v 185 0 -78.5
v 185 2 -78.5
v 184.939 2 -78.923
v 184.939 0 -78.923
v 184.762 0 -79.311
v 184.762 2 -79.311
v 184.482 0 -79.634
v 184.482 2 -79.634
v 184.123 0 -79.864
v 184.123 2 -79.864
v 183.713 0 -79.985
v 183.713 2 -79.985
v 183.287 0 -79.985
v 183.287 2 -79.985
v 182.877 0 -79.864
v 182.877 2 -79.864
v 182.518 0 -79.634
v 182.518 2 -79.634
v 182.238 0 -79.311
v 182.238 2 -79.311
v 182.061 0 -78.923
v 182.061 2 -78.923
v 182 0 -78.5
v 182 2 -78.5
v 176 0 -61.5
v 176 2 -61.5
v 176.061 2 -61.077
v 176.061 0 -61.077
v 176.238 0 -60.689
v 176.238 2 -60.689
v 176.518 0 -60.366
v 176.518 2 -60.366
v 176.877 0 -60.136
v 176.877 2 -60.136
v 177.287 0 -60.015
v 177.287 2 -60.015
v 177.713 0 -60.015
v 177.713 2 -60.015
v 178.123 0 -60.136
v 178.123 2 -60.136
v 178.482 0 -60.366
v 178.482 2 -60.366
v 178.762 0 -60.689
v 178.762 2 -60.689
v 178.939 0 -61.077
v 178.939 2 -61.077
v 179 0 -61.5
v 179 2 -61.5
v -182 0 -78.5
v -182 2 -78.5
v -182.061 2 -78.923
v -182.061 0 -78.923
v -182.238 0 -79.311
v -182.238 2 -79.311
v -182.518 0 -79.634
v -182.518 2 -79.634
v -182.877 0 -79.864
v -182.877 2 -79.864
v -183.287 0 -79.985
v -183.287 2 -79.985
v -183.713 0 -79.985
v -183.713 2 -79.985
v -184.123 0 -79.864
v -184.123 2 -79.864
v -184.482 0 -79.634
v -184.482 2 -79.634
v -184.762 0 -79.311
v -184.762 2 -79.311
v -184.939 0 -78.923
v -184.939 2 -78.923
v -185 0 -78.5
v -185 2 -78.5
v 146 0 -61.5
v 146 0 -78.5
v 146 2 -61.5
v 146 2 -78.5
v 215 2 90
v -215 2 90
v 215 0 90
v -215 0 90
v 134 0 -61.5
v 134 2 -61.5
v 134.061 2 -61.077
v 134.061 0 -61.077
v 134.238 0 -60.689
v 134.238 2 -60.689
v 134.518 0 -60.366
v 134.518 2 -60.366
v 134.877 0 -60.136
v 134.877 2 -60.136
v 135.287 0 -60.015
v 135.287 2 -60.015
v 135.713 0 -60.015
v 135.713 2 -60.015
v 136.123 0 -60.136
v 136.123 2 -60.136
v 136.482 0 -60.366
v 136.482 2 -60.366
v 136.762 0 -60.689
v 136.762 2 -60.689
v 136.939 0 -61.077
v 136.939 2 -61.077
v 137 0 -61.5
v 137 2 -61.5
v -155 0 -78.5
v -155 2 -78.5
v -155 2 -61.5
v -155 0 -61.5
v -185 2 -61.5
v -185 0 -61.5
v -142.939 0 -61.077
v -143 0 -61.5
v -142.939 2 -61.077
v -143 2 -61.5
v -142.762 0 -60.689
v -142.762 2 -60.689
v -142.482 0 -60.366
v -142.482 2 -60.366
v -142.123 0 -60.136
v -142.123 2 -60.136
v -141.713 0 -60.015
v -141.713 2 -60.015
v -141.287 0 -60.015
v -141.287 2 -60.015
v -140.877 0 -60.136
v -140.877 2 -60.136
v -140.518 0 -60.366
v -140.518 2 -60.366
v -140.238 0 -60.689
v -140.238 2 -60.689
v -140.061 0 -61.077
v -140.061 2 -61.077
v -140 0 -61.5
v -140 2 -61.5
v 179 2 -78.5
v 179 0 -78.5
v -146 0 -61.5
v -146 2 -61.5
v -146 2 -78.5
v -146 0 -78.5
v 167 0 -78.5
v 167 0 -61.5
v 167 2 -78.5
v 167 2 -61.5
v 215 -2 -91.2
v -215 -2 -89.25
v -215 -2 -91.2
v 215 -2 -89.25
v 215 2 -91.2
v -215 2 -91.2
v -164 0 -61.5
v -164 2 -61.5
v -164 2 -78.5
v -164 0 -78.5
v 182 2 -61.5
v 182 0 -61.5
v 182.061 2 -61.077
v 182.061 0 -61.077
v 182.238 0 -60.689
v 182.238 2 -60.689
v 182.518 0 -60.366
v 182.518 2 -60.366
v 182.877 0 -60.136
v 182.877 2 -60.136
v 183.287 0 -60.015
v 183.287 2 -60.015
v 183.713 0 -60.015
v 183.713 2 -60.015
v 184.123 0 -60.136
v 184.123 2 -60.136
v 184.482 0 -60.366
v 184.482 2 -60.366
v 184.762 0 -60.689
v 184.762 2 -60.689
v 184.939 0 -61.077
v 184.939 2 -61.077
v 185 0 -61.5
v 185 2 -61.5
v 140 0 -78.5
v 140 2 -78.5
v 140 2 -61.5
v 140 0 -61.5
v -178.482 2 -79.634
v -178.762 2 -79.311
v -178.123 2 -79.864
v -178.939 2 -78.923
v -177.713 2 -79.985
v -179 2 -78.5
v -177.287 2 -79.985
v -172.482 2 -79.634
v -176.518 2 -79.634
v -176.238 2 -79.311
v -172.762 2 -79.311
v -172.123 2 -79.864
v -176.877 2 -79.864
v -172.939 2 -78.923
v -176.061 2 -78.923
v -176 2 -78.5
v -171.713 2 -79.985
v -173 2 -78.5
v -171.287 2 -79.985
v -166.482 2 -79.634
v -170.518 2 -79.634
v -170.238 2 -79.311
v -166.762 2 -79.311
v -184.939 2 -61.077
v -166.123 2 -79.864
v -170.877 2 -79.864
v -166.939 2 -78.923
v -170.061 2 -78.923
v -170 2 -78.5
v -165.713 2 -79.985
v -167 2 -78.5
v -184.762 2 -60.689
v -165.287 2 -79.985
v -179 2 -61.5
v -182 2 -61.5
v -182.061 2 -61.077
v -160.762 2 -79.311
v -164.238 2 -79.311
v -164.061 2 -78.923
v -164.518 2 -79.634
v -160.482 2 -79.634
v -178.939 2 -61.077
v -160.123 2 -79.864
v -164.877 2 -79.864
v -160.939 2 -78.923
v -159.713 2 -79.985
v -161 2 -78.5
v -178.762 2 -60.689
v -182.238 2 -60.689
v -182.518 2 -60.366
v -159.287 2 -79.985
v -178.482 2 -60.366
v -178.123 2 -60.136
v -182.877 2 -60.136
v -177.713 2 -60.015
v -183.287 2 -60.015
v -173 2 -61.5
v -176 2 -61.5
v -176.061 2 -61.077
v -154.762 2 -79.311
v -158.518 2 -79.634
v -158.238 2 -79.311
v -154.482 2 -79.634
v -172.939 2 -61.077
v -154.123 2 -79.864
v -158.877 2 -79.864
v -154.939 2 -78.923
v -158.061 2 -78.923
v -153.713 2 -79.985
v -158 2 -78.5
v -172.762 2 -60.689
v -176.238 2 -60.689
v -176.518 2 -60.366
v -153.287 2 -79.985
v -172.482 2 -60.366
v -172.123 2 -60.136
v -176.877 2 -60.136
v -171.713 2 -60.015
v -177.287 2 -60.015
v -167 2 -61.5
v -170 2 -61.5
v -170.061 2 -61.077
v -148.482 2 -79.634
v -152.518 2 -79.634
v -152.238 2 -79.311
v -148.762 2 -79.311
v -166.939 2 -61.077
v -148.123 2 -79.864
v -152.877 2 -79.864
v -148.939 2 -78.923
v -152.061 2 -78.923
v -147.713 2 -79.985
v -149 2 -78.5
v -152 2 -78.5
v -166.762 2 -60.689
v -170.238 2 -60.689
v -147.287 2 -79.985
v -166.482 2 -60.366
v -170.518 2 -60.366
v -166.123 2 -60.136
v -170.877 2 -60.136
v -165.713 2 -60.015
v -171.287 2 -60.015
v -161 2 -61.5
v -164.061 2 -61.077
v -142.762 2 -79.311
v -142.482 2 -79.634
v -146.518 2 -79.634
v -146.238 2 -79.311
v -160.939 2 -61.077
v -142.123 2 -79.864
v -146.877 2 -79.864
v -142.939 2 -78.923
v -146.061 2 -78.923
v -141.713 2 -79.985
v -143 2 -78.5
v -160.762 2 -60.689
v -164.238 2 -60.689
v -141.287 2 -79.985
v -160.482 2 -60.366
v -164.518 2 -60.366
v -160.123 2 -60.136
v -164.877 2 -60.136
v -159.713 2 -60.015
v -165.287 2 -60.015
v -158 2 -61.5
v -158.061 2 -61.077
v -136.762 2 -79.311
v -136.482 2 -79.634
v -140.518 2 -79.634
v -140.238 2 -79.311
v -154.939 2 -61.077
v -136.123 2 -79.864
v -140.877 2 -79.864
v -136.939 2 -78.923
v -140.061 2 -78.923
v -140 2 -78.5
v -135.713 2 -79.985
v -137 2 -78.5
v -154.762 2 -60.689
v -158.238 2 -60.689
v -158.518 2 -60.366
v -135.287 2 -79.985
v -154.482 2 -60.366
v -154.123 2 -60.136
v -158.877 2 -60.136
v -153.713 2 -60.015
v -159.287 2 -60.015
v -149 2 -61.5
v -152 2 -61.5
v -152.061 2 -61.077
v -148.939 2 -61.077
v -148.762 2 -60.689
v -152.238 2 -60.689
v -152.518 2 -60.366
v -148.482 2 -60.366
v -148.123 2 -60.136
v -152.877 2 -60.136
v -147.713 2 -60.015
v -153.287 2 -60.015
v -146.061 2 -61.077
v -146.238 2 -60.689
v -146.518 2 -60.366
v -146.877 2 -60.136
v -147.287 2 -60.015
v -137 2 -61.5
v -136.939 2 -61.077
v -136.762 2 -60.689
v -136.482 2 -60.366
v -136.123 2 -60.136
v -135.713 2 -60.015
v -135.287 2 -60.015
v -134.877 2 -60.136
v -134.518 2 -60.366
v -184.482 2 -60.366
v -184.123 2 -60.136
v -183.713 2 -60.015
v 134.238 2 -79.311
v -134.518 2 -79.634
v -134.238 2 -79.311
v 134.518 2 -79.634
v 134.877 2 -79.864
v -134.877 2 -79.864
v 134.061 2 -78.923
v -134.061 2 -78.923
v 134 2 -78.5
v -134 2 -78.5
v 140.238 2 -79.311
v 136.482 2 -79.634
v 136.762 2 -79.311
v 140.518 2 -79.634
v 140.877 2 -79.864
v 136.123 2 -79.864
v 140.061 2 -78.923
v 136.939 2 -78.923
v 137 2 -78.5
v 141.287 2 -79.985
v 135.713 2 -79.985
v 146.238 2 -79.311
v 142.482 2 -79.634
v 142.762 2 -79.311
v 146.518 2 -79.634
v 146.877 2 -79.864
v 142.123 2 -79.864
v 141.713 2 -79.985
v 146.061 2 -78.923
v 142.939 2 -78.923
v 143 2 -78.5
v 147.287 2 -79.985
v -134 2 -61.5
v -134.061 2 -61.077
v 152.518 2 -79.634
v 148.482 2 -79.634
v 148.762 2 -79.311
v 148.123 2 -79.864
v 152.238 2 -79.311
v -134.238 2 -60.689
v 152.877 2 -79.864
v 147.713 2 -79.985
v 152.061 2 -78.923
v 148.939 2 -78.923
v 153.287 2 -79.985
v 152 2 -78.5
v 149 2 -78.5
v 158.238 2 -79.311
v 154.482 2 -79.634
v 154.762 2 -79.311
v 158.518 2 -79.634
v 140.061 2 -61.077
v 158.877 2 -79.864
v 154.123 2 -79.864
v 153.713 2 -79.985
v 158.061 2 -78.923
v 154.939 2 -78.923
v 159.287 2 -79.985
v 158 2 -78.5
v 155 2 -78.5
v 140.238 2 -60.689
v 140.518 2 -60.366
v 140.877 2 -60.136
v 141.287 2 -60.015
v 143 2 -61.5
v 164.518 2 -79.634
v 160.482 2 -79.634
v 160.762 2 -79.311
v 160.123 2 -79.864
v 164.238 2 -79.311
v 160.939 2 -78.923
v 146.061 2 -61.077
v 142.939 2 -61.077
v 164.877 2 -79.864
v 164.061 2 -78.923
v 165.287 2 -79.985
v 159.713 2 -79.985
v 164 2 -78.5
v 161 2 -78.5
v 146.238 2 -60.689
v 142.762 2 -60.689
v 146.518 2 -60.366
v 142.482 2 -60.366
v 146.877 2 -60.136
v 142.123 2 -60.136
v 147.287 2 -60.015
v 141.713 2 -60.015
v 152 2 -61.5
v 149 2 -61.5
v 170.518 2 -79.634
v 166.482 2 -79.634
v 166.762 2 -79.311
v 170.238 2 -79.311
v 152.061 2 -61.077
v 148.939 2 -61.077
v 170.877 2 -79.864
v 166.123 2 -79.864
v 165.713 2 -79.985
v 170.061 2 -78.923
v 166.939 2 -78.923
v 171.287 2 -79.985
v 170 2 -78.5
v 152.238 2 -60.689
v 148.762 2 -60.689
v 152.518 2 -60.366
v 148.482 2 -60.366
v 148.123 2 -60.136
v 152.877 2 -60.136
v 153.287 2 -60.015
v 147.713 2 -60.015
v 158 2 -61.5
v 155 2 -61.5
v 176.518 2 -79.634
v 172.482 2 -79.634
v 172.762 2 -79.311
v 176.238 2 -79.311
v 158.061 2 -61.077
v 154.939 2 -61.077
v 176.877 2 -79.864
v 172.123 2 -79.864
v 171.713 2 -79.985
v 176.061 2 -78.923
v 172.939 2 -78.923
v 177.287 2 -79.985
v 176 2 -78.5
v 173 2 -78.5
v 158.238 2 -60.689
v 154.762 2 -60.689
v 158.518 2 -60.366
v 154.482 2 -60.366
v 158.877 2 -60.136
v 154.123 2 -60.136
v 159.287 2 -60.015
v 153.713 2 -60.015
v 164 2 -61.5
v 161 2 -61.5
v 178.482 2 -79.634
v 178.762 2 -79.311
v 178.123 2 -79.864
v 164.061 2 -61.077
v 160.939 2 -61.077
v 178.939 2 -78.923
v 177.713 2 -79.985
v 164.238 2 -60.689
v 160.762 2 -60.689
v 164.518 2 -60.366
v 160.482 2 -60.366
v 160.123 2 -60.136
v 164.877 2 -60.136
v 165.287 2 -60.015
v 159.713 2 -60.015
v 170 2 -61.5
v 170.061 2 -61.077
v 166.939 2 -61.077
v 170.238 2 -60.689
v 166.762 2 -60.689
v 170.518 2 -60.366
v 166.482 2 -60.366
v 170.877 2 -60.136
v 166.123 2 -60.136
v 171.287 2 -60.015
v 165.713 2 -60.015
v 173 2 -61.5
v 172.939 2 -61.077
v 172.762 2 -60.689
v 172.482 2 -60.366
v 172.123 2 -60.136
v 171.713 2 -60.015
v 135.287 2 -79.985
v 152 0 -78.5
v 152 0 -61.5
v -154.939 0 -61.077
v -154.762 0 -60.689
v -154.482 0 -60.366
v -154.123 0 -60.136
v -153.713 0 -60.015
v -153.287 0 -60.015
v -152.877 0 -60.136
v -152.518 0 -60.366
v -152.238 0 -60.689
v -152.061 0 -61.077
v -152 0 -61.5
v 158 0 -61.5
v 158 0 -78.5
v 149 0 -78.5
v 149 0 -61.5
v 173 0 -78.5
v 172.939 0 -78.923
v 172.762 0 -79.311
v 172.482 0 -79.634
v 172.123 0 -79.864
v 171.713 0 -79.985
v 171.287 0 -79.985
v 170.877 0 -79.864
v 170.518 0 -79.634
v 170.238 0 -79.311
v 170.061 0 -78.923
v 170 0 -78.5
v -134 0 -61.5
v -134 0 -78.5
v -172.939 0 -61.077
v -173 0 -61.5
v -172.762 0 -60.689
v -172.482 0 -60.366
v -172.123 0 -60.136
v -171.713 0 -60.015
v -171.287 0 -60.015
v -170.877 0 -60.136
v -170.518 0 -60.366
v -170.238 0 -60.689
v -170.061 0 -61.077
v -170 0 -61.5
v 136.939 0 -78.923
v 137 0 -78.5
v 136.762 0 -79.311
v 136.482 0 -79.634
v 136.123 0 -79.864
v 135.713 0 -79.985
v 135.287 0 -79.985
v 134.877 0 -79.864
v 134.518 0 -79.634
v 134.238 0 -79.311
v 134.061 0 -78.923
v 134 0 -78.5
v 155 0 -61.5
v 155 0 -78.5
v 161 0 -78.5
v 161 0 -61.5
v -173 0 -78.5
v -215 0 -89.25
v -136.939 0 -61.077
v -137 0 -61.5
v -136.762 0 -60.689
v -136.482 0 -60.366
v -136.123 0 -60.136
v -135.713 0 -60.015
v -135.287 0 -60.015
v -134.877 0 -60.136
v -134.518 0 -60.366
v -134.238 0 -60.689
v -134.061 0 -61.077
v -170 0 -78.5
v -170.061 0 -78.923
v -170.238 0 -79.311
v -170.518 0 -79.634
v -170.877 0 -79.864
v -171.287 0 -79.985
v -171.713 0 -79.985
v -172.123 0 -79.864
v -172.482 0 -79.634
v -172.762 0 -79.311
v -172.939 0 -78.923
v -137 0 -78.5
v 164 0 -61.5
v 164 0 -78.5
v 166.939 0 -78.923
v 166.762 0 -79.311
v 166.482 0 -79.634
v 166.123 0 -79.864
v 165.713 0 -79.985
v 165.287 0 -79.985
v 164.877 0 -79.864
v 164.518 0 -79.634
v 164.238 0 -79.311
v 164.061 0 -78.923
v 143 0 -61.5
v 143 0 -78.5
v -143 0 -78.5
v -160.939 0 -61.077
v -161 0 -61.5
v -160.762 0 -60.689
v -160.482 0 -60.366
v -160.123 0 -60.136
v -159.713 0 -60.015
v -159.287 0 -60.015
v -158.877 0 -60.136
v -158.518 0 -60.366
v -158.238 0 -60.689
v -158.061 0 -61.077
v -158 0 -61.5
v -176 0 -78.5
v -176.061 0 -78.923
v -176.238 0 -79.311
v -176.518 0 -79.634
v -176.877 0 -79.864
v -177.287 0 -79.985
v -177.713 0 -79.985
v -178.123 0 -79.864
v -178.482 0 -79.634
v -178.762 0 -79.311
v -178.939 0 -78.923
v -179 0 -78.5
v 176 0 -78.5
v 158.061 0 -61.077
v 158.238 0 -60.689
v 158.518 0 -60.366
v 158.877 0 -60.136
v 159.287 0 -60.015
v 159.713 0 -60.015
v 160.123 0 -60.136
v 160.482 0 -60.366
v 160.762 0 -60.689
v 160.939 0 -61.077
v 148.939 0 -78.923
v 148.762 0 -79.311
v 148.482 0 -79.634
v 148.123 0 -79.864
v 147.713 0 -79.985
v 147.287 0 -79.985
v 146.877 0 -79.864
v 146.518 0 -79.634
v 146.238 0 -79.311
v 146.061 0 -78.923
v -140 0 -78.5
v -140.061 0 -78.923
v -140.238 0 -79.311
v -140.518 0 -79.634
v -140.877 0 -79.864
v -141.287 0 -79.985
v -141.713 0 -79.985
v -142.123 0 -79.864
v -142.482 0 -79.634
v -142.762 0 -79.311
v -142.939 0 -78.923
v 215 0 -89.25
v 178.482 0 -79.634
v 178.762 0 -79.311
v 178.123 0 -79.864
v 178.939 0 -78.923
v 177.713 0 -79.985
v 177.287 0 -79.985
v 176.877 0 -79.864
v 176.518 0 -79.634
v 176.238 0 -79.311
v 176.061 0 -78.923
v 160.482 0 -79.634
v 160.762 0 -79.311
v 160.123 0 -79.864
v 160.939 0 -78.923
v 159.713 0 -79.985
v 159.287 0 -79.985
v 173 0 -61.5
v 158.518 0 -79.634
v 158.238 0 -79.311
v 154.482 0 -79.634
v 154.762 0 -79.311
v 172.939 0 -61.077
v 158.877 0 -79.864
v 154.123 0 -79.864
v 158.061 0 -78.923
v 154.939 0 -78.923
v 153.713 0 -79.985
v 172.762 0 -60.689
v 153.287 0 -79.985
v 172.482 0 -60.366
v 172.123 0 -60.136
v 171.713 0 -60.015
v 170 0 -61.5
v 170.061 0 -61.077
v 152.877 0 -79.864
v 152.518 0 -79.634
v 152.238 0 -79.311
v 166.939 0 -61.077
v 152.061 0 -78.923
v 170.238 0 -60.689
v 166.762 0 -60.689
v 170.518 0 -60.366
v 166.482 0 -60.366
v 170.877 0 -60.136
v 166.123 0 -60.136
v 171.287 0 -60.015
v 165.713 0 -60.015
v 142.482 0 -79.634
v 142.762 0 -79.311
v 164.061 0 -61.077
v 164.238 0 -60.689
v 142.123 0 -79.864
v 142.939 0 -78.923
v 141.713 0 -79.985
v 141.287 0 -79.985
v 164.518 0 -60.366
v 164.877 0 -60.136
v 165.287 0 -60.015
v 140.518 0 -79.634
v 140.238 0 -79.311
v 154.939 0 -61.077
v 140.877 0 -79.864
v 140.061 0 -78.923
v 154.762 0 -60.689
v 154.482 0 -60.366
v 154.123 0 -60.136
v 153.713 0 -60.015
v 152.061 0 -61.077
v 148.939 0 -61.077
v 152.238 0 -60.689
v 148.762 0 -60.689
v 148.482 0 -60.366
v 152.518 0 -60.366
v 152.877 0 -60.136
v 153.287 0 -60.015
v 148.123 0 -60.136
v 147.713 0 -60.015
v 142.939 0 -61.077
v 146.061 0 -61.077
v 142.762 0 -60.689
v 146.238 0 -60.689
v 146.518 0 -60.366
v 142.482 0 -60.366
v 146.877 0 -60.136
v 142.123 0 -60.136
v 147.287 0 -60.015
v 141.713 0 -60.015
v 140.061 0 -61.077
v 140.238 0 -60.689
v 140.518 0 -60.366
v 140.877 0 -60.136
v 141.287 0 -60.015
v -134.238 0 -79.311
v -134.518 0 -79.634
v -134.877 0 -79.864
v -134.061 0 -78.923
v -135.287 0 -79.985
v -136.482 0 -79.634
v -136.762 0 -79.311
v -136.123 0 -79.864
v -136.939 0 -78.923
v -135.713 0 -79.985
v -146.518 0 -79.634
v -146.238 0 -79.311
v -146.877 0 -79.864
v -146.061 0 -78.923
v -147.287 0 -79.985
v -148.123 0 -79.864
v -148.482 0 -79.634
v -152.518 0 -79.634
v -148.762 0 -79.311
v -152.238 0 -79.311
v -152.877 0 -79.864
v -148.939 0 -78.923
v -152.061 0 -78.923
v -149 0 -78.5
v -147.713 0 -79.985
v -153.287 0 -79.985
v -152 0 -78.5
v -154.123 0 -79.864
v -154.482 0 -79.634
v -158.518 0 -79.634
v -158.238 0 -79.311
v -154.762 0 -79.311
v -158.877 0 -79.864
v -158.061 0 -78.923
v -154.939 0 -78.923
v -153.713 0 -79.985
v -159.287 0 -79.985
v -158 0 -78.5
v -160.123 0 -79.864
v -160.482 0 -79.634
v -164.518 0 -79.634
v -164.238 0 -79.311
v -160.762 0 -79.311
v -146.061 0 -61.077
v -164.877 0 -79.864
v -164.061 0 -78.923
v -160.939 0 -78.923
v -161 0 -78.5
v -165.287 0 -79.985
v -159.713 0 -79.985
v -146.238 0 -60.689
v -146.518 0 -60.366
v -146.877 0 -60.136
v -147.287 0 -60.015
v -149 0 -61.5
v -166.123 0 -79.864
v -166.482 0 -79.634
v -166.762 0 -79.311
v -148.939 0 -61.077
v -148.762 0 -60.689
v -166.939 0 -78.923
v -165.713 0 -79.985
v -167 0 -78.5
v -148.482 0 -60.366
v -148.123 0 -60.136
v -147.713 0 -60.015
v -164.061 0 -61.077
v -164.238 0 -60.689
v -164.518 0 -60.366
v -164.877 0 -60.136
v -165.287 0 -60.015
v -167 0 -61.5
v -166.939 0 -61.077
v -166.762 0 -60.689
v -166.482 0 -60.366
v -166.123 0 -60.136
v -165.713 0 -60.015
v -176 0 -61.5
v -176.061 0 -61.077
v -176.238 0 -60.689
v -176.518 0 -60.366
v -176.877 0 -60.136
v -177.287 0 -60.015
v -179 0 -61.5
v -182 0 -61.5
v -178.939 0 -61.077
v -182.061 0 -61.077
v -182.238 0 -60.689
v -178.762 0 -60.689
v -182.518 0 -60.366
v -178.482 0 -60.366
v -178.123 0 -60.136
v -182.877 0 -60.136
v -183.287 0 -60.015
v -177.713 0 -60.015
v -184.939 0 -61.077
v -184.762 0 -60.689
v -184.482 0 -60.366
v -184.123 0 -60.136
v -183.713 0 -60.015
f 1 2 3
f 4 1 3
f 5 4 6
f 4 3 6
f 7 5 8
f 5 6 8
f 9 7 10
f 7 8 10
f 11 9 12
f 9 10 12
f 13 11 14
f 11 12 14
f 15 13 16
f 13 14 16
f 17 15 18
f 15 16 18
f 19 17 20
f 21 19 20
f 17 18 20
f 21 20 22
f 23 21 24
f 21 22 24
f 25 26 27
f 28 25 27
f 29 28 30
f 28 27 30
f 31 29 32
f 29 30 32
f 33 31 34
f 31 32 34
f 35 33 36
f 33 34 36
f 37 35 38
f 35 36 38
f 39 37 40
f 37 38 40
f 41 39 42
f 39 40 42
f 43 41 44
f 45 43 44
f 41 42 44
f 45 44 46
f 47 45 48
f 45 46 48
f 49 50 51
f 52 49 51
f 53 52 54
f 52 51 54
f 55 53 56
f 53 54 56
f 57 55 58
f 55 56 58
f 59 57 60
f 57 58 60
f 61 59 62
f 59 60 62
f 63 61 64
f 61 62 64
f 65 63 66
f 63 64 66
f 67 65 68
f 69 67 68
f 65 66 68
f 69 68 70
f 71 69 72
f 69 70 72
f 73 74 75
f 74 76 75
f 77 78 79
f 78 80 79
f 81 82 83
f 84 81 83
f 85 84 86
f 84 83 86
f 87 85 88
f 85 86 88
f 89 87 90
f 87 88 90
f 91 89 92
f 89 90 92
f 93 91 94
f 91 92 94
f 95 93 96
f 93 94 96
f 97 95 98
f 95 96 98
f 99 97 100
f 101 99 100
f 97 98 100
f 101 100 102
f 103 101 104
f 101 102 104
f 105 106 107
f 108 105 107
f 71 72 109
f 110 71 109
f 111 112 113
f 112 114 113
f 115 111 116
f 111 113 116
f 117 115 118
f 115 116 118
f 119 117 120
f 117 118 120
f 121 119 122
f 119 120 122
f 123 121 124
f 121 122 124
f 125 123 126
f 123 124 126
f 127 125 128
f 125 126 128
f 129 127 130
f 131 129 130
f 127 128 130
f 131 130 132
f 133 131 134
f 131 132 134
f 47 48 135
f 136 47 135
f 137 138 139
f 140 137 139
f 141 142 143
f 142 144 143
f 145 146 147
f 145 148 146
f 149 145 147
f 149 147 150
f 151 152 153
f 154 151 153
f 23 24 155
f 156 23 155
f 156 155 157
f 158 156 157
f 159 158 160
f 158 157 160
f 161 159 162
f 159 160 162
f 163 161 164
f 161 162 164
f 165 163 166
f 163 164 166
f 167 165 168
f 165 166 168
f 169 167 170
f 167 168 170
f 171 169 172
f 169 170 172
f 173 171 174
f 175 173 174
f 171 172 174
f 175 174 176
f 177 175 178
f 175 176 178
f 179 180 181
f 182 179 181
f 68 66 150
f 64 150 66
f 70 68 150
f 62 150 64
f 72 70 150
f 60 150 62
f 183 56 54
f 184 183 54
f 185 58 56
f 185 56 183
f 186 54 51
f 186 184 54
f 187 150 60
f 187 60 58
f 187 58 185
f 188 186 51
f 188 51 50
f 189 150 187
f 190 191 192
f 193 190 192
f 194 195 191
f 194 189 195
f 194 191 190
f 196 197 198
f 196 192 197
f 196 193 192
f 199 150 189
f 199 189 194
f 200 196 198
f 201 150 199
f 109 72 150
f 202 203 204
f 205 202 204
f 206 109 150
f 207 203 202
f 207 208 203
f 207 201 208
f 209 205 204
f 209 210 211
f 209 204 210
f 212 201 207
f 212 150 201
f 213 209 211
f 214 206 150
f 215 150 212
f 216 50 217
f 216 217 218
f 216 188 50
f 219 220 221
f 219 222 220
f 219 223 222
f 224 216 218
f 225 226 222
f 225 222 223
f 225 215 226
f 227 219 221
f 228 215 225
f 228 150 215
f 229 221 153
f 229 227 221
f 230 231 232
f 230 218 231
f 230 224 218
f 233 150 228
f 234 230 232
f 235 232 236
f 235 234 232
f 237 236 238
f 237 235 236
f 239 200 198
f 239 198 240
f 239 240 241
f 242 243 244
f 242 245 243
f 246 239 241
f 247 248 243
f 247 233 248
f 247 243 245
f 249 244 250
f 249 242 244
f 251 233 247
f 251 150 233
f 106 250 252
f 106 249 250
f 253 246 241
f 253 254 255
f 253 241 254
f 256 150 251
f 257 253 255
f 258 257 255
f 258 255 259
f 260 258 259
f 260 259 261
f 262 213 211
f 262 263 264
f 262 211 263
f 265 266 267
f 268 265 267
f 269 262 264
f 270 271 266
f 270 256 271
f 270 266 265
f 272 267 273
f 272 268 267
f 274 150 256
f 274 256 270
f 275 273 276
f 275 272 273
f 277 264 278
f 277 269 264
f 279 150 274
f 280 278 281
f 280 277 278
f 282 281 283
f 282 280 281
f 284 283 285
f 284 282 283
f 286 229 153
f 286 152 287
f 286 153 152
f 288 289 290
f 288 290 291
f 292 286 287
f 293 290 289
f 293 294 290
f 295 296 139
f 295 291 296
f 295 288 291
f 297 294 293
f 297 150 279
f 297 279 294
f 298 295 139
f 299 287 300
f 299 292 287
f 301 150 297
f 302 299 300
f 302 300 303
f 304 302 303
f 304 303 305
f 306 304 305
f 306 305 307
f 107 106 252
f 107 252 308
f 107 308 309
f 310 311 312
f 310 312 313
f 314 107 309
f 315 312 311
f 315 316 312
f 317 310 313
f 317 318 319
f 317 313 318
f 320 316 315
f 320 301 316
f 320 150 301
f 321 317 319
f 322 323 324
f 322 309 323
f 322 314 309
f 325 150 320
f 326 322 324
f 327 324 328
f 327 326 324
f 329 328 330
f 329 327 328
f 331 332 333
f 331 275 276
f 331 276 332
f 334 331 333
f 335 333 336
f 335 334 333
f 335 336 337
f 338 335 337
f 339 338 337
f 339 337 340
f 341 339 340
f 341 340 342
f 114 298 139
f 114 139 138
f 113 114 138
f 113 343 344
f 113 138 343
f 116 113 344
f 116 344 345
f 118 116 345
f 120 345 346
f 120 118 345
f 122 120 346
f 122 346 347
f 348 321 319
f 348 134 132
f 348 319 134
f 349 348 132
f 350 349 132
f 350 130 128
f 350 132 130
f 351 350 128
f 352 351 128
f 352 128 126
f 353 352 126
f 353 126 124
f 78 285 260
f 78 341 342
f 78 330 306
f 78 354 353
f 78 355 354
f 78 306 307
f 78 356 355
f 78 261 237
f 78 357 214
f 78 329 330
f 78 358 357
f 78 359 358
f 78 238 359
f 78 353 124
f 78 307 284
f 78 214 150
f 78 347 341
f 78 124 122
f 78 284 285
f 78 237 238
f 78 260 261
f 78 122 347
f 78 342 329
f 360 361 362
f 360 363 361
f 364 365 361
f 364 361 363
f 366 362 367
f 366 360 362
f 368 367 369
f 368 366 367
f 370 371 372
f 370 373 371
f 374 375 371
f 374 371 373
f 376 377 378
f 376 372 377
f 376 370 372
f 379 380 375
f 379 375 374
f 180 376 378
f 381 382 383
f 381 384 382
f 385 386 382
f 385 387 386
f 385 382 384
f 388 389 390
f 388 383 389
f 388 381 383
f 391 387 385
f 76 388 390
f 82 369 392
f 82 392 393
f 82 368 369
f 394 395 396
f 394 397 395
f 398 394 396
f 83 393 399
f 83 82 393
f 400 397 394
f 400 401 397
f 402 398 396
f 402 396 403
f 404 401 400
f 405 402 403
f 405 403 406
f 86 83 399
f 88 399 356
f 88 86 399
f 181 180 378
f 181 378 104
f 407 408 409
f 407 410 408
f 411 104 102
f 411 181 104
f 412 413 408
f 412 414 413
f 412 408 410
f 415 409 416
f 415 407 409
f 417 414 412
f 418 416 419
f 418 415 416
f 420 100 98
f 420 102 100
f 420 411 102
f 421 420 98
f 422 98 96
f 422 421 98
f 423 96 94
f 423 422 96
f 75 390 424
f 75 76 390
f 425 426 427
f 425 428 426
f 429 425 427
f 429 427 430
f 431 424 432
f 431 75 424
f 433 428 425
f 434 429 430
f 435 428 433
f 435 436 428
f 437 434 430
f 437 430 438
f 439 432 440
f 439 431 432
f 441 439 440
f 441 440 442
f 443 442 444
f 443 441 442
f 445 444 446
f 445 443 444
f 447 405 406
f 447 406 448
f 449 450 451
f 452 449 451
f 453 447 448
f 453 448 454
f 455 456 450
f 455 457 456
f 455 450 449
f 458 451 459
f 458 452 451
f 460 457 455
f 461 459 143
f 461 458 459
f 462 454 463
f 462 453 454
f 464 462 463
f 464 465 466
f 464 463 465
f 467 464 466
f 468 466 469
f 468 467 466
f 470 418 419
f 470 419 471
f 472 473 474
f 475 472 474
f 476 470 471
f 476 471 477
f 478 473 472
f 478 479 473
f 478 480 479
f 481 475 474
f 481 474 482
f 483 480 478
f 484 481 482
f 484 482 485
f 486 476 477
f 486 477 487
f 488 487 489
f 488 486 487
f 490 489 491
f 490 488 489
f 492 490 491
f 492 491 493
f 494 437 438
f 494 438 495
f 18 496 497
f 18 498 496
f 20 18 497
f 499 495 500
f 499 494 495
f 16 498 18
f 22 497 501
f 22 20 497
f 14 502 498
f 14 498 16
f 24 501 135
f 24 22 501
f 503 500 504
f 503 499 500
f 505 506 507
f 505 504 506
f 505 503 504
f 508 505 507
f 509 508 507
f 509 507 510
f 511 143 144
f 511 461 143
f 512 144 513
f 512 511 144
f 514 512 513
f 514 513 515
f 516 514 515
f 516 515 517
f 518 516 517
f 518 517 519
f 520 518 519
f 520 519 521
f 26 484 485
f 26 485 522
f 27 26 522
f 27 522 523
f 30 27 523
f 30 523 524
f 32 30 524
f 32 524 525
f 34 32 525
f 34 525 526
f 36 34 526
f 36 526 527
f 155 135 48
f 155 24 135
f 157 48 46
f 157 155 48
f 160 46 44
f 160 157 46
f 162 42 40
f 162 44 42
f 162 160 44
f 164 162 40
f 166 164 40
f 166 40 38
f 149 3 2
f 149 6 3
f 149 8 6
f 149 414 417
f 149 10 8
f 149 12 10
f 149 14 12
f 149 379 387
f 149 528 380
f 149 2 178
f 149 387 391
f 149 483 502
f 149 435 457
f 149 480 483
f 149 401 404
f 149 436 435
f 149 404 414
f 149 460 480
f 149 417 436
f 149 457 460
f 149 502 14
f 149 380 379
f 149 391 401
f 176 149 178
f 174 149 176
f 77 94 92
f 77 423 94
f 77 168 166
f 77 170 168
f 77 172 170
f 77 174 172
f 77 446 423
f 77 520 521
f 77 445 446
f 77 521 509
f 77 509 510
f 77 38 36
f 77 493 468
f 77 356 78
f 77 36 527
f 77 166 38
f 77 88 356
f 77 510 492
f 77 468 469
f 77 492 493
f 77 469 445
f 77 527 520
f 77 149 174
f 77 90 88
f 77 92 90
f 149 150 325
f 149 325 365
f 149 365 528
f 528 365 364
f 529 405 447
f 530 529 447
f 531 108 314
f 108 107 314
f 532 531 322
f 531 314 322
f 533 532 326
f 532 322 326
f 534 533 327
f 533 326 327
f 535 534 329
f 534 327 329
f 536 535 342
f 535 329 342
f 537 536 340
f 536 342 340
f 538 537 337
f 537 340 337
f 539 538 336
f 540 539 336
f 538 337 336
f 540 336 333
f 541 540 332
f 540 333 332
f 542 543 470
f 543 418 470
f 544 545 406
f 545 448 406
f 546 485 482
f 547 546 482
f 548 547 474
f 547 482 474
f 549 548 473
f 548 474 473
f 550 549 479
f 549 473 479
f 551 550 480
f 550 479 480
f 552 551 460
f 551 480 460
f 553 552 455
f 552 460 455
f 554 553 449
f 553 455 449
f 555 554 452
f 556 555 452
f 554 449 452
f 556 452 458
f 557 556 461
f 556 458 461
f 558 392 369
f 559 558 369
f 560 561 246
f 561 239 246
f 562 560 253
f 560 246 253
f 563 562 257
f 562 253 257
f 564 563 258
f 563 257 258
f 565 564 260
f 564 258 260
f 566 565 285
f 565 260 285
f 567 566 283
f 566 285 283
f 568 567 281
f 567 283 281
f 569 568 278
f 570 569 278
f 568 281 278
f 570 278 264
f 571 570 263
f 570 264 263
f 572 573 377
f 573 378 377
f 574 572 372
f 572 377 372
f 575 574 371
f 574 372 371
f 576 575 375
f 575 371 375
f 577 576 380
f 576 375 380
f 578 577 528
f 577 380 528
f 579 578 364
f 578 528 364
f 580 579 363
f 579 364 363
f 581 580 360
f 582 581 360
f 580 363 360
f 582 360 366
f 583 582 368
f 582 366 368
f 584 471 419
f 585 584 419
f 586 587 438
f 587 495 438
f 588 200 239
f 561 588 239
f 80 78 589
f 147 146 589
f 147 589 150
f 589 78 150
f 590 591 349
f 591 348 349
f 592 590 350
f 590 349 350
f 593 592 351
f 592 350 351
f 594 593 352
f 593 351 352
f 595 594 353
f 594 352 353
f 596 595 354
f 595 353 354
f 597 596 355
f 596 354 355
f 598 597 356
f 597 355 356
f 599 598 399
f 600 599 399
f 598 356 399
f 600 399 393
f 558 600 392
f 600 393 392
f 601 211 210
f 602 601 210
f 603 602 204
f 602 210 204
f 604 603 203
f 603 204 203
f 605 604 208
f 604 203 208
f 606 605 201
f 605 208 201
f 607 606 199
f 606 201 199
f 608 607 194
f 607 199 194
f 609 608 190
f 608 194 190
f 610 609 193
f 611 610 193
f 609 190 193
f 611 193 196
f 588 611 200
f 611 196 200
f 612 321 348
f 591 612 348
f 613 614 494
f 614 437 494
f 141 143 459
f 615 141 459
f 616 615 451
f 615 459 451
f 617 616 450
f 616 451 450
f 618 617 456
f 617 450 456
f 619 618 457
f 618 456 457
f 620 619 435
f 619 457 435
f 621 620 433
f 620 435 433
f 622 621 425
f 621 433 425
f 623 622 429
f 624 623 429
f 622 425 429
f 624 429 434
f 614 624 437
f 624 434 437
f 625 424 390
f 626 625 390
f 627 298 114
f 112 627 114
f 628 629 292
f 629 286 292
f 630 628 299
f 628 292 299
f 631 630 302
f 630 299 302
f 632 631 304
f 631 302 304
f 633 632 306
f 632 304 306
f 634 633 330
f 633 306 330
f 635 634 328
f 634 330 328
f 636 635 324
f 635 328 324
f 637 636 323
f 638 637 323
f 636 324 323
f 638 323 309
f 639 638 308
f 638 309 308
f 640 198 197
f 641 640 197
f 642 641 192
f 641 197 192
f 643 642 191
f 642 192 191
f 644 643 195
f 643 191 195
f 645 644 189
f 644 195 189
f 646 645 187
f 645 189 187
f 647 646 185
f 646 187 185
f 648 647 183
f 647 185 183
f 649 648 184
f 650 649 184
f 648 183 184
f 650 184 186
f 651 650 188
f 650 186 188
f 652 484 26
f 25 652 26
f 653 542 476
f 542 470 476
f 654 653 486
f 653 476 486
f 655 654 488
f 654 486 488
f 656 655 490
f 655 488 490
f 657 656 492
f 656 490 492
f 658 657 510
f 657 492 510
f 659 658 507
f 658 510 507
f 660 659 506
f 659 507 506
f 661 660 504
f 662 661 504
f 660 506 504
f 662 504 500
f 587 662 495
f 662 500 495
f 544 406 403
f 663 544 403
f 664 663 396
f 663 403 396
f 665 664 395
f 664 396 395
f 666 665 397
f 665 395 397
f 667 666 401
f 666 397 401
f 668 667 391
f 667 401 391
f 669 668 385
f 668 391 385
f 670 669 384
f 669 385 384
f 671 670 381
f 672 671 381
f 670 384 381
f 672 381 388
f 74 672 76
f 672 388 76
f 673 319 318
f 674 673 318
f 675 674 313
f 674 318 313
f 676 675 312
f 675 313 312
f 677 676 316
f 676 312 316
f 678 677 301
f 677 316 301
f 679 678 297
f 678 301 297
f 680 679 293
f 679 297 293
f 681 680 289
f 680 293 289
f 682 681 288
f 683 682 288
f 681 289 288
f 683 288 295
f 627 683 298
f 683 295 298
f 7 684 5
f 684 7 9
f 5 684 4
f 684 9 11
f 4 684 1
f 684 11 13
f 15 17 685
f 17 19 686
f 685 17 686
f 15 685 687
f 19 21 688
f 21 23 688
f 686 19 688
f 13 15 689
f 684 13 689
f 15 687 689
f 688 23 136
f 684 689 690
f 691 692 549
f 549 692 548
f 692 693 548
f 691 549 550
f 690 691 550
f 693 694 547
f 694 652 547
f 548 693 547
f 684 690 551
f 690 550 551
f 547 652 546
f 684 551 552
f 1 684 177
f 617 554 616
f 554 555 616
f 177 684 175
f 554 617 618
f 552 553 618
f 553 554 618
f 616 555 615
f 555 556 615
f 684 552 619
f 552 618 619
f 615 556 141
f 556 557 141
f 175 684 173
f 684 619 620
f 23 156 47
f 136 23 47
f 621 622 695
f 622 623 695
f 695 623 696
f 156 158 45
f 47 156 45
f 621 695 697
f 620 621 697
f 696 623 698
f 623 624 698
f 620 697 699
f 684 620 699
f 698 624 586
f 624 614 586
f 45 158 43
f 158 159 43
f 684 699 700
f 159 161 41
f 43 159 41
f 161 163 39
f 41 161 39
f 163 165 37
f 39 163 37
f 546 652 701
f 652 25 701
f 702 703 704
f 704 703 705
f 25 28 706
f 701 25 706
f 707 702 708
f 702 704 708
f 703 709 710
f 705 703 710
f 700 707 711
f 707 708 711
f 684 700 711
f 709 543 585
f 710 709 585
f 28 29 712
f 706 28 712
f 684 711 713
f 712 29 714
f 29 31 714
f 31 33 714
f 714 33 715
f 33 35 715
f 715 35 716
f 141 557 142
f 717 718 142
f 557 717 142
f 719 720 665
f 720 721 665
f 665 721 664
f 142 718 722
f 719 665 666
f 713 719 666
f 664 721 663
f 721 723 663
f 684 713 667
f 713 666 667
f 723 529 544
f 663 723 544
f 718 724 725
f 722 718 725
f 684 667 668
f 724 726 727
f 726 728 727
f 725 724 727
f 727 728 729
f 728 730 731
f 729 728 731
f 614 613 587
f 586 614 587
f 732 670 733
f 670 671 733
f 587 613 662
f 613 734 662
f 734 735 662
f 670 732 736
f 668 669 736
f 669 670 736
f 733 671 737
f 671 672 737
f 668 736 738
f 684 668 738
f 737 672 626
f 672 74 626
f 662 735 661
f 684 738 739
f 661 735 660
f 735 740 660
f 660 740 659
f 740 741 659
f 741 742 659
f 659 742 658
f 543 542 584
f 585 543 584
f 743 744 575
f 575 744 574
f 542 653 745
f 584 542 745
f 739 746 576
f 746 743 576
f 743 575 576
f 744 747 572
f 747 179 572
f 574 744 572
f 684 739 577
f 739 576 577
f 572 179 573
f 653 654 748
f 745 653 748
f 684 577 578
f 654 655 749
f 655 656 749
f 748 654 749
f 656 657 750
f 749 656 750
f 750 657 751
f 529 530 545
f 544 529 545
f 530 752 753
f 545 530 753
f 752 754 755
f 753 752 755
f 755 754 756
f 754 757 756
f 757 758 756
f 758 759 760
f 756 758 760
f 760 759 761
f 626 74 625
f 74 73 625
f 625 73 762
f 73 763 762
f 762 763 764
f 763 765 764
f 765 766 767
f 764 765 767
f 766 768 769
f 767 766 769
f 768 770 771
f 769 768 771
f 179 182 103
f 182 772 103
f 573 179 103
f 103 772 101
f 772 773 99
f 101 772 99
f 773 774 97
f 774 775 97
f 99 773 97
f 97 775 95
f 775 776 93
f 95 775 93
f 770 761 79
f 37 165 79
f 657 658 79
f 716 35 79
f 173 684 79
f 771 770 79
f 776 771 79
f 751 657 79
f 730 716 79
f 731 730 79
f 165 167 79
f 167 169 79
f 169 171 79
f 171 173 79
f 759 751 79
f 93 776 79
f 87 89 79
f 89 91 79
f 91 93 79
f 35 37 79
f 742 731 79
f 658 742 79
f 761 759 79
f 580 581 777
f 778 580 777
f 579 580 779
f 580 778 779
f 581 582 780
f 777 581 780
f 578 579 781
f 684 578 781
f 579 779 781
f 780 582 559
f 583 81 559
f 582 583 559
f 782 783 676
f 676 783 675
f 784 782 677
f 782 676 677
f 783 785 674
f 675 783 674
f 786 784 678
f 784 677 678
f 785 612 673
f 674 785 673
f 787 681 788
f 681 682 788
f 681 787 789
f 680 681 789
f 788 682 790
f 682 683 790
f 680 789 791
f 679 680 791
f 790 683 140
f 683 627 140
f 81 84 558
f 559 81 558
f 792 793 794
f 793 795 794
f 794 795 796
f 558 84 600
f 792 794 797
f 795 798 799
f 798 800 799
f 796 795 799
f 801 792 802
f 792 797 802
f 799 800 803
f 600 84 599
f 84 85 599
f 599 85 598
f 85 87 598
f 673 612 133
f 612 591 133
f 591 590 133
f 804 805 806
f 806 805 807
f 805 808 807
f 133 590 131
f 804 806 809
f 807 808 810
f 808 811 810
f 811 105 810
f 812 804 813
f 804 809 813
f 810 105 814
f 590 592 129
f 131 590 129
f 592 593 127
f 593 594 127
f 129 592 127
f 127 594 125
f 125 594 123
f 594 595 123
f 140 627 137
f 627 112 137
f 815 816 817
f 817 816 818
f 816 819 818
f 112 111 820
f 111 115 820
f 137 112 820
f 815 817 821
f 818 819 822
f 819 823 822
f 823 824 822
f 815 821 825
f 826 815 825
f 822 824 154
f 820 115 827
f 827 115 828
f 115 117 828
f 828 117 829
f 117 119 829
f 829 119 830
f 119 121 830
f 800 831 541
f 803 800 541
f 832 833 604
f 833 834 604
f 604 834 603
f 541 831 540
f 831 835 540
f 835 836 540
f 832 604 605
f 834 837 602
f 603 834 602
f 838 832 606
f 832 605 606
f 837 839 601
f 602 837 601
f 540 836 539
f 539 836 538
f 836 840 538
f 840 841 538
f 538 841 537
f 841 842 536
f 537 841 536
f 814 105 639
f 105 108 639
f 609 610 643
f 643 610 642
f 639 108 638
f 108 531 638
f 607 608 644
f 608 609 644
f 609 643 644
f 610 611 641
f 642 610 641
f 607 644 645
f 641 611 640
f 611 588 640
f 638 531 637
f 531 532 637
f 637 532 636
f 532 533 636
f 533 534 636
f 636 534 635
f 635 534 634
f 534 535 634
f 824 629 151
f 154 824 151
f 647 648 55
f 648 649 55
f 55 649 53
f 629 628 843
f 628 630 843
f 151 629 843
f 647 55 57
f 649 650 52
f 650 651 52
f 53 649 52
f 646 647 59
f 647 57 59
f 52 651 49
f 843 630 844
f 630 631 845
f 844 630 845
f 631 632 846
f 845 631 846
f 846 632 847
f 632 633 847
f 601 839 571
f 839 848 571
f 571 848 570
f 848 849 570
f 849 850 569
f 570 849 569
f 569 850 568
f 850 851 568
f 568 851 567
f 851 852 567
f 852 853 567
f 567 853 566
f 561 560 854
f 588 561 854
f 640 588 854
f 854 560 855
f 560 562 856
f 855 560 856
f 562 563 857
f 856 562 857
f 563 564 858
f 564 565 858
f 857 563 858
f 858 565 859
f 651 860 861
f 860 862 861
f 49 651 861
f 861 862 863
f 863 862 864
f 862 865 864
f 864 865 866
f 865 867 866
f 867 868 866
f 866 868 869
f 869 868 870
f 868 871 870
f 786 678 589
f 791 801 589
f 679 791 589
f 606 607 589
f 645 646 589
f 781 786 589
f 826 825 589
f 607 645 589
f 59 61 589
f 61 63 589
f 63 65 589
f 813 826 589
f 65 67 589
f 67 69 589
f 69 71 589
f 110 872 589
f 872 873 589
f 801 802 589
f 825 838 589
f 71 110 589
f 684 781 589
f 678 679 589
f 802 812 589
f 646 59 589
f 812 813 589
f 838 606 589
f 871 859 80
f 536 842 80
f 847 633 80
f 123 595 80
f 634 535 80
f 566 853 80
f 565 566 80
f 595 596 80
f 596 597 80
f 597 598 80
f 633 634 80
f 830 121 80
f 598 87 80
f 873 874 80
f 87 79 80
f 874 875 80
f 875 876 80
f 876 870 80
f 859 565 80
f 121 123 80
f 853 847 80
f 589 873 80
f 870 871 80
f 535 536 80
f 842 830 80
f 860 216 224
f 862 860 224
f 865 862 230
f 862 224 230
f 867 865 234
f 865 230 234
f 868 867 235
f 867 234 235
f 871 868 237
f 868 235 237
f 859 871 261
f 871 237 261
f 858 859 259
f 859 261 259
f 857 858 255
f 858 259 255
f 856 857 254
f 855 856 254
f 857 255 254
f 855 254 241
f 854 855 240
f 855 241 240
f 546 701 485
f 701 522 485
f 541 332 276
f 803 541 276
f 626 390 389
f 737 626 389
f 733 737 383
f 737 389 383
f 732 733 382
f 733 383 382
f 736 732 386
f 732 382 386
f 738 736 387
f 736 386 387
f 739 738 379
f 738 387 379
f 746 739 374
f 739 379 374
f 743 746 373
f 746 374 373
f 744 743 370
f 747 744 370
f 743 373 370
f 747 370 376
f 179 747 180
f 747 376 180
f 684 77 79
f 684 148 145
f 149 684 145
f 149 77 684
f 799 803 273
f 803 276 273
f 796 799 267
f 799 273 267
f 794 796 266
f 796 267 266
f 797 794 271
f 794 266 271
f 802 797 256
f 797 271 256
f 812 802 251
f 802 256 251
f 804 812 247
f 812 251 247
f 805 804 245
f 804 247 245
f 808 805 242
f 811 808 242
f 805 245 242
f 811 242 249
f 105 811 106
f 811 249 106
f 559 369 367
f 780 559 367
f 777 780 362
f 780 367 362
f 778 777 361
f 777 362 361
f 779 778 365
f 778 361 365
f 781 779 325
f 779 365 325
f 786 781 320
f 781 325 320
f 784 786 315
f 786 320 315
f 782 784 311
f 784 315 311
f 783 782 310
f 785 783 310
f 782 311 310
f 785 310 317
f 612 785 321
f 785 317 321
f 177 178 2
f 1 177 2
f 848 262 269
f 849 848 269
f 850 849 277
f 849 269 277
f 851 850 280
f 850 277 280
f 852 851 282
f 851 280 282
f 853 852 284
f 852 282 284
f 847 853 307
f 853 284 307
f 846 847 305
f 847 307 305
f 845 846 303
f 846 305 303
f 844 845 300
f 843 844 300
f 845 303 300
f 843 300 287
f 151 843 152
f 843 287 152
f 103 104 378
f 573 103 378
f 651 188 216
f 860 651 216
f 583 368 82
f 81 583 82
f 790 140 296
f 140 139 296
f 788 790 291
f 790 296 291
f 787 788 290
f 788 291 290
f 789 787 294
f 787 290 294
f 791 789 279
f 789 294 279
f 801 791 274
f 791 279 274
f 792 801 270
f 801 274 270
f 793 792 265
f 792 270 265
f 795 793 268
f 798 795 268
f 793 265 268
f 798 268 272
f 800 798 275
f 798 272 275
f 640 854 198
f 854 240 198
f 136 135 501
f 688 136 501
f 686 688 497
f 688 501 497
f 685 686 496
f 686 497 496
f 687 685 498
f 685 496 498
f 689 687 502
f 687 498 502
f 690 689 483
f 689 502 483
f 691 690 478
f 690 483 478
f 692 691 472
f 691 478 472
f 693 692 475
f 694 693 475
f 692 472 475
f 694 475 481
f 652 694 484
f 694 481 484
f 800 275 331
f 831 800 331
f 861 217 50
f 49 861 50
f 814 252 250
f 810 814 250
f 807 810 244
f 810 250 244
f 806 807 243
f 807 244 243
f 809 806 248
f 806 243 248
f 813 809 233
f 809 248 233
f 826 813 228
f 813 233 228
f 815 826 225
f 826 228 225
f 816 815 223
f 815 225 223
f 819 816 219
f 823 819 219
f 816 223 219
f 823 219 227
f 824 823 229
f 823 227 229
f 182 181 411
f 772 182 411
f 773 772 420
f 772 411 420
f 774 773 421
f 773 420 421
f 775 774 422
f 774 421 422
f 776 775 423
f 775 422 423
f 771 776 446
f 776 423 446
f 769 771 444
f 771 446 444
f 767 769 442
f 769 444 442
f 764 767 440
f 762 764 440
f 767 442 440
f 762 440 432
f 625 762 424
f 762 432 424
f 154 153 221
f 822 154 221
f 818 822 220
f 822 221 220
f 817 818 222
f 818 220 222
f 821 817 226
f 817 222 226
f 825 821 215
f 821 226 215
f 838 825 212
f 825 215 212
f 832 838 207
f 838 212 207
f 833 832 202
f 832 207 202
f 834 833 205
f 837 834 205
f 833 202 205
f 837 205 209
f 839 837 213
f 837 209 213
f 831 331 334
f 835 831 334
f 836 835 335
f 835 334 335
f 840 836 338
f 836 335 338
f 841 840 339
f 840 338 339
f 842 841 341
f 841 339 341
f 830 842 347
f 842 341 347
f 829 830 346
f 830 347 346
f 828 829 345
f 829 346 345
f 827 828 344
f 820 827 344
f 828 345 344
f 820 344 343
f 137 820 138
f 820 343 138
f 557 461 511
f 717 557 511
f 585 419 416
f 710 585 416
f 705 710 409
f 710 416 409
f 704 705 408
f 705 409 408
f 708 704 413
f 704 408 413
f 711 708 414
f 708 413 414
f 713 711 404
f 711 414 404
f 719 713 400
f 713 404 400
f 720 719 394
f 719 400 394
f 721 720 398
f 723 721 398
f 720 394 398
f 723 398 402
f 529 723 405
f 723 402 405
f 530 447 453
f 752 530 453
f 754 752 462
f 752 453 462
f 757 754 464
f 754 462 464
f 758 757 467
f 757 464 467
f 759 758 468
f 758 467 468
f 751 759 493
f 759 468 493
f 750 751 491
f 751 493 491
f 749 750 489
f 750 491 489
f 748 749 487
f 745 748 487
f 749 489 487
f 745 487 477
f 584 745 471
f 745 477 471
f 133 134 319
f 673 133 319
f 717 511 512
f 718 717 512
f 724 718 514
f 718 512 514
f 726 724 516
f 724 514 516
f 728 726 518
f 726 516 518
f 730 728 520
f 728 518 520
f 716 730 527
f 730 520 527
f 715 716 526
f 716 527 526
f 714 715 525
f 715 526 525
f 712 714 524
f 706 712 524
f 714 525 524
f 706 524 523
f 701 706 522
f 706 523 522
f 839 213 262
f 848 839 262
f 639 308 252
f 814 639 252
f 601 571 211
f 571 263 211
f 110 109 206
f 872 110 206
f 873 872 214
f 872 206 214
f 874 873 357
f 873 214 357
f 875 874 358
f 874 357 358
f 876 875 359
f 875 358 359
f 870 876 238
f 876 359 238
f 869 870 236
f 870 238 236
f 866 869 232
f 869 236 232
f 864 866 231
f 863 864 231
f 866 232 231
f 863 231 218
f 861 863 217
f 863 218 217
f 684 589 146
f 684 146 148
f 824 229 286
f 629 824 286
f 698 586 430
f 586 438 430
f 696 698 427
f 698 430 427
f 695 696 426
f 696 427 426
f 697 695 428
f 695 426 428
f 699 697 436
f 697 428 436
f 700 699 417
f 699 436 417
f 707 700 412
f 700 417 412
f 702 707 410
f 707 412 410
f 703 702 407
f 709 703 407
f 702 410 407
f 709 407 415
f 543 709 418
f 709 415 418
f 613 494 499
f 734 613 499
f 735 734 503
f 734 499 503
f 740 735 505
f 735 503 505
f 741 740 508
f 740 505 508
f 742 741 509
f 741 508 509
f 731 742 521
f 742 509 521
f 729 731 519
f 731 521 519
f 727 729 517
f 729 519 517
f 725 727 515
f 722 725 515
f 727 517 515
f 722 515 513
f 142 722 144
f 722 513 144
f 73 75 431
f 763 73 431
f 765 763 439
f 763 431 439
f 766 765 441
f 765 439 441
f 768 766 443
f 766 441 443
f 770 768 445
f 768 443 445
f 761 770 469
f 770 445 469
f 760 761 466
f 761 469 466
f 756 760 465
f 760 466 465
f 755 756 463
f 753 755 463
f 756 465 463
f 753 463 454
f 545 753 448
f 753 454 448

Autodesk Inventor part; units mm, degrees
ref_plane "YZ Plane" through (0, 0, 0) normal (1, 0, 0) x (0, 1, 0)
ref_plane "XZ Plane" through (0, 0, 0) normal (0, 1, 0) x (-1, 0, 0)
ref_plane "XY Plane" through (0, 0, 0) normal (0, 0, 1) x (1, 0, 0)
sketch "Esboço1" plane through (0, 0, 0) normal (0, 1, 0) x (-1, 0, 0)
  line L0 (215, 90) -> (-215, 90)
  line L1 (-215, 90) -> (-215, -90)
  line L2 (-215, -90) -> (215, -90)
  line L3 (215, -90) -> (215, 90)
  point P0 (0, 0)
  dimension "d3" = 180
  dimension "d5" = 215
  dimension "d6" = 430
  dimension "d7" = 90
extrude "Extrusão1" add sketch "Esboço1" along normal blind 2
sketch "Esboço2" plane through (0, 0, 0) normal (0, -1, 0) x (1, 0, 0)
  line L0 (215, -90) -> (-215, -90) projected
  line L1 (-215, -90) -> (-215, -89.25)
  line L2 (-215, -90) -> (-215, 90) projected
  line L3 (-215, -89.25) -> (215, -89.25)
  line L4 (215, 90) -> (215, -90) projected
  line L5 (215, -89.25) -> (215, -90)
  line L6 (215, -90) -> (-215, -90)
  point P0 (0, 0)
  dimension "d10" = 0.75
  dimension "d11" = 430
extrude "Extrusão2" add sketch "Esboço2" along normal blind 2
sketch "Esboço3" plane through (0, 2, 0) normal (0, 1, 0) x (1, 0, 0)
  line L0 (-215, 90) -> (215, 90) projected
  line L1 (-215, 80) -> (215, 80) construction
  line L2 (-215, 80) -> (-215, 60) construction
  line L3 (-215, 60) -> (215, 60) construction
  line L4 (215, 80) -> (215, 60) construction
  line L5 (-185, 60) -> (-182, 60) construction
  line L6 (-182, 60) -> (-182, 80) construction
  line L7 (-182, 80) -> (-185, 80) construction
  line L8 (-185, 80) -> (-185, 60) construction
  line L9 (-183.5, 60) -> (-183.5, 80) construction
  line L10 (-182, 61.5) -> (-182, 78.5)
  line L11 (-185, 78.5) -> (-185, 61.5)
  arc A0 (-185, 61.5) -> (-182, 61.5) centre (-183.5, 61.5) ccw
  arc A1 (-182, 78.5) -> (-185, 78.5) centre (-183.5, 78.5) ccw
  line L12 (-179, 78.5) -> (-179, 61.5)
  arc A2 (-176, 78.5) -> (-179, 78.5) centre (-177.5, 78.5) ccw
  line L13 (-176, 61.5) -> (-176, 78.5)
  arc A3 (-179, 61.5) -> (-176, 61.5) centre (-177.5, 61.5) ccw
  line L14 (-173, 78.5) -> (-173, 61.5)
  arc A4 (-170, 78.5) -> (-173, 78.5) centre (-171.5, 78.5) ccw
  line L15 (-170, 61.5) -> (-170, 78.5)
  arc A5 (-173, 61.5) -> (-170, 61.5) centre (-171.5, 61.5) ccw
  line L16 (-167, 78.5) -> (-167, 61.5)
  arc A6 (-164, 78.5) -> (-167, 78.5) centre (-165.5, 78.5) ccw
  line L17 (-164, 61.5) -> (-164, 78.5)
  arc A7 (-167, 61.5) -> (-164, 61.5) centre (-165.5, 61.5) ccw
  line L18 (-161, 78.5) -> (-161, 61.5)
  arc A8 (-158, 78.5) -> (-161, 78.5) centre (-159.5, 78.5) ccw
  line L19 (-158, 61.5) -> (-158, 78.5)
  arc A9 (-161, 61.5) -> (-158, 61.5) centre (-159.5, 61.5) ccw
  line L20 (-155, 78.5) -> (-155, 61.5)
  arc A10 (-152, 78.5) -> (-155, 78.5) centre (-153.5, 78.5) ccw
  line L21 (-152, 61.5) -> (-152, 78.5)
  arc A11 (-155, 61.5) -> (-152, 61.5) centre (-153.5, 61.5) ccw
  line L22 (-149, 78.5) -> (-149, 61.5)
  arc A12 (-146, 78.5) -> (-149, 78.5) centre (-147.5, 78.5) ccw
  line L23 (-146, 61.5) -> (-146, 78.5)
  arc A13 (-149, 61.5) -> (-146, 61.5) centre (-147.5, 61.5) ccw
  line L24 (-143, 78.5) -> (-143, 61.5)
  arc A14 (-140, 78.5) -> (-143, 78.5) centre (-141.5, 78.5) ccw
  line L25 (-140, 61.5) -> (-140, 78.5)
  arc A15 (-143, 61.5) -> (-140, 61.5) centre (-141.5, 61.5) ccw
  line L26 (-137, 78.5) -> (-137, 61.5)
  arc A16 (-134, 78.5) -> (-137, 78.5) centre (-135.5, 78.5) ccw
  line L27 (-134, 61.5) -> (-134, 78.5)
  arc A17 (-137, 61.5) -> (-134, 61.5) centre (-135.5, 61.5) ccw
  line L28 (185, 60) -> (182, 60) construction
  line L29 (182, 60) -> (182, 80) construction
  line L30 (182, 80) -> (185, 80) construction
  line L31 (185, 80) -> (185, 60) construction
  line L32 (183.5, 80) -> (183.5, 60) construction
  line L33 (182, 78.5) -> (182, 61.5)
  line L34 (185, 61.5) -> (185, 78.5)
  arc A18 (185, 78.5) -> (182, 78.5) centre (183.5, 78.5) ccw
  arc A19 (182, 61.5) -> (185, 61.5) centre (183.5, 61.5) ccw
  arc A20 (179, 78.5) -> (176, 78.5) centre (177.5, 78.5) ccw
  line L35 (179, 61.5) -> (179, 78.5)
  line L36 (176, 78.5) -> (176, 61.5)
  arc A21 (176, 61.5) -> (179, 61.5) centre (177.5, 61.5) ccw
  arc A22 (173, 78.5) -> (170, 78.5) centre (171.5, 78.5) ccw
  line L37 (173, 61.5) -> (173, 78.5)
  line L38 (170, 78.5) -> (170, 61.5)
  arc A23 (170, 61.5) -> (173, 61.5) centre (171.5, 61.5) ccw
  arc A24 (167, 78.5) -> (164, 78.5) centre (165.5, 78.5) ccw
  line L39 (167, 61.5) -> (167, 78.5)
  line L40 (164, 78.5) -> (164, 61.5)
  arc A25 (164, 61.5) -> (167, 61.5) centre (165.5, 61.5) ccw
  arc A26 (161, 78.5) -> (158, 78.5) centre (159.5, 78.5) ccw
  line L41 (161, 61.5) -> (161, 78.5)
  line L42 (158, 78.5) -> (158, 61.5)
  arc A27 (158, 61.5) -> (161, 61.5) centre (159.5, 61.5) ccw
  arc A28 (155, 78.5) -> (152, 78.5) centre (153.5, 78.5) ccw
  line L43 (155, 61.5) -> (155, 78.5)
  line L44 (152, 78.5) -> (152, 61.5)
  arc A29 (152, 61.5) -> (155, 61.5) centre (153.5, 61.5) ccw
  arc A30 (149, 78.5) -> (146, 78.5) centre (147.5, 78.5) ccw
  line L45 (149, 61.5) -> (149, 78.5)
  line L46 (146, 78.5) -> (146, 61.5)
  arc A31 (146, 61.5) -> (149, 61.5) centre (147.5, 61.5) ccw
  arc A32 (143, 78.5) -> (140, 78.5) centre (141.5, 78.5) ccw
  line L47 (143, 61.5) -> (143, 78.5)
  line L48 (140, 78.5) -> (140, 61.5)
  arc A33 (140, 61.5) -> (143, 61.5) centre (141.5, 61.5) ccw
  arc A34 (137, 78.5) -> (134, 78.5) centre (135.5, 78.5) ccw
  line L49 (137, 61.5) -> (137, 78.5)
  line L50 (134, 78.5) -> (134, 61.5)
  arc A35 (134, 61.5) -> (137, 61.5) centre (135.5, 61.5) ccw
  point P0 (0, 0)
  point P1 (-183.5, 70)
  point P2 (183.5, 70)
  dimension "d15" = 430
  dimension "d16" = 20
  dimension "d19" = 6
  dimension "d26" = 6
  dimension "d31" = 20
  dimension "d33" = 3
  dimension "d35" = 15
  dimension "d37" = 1.5
  dimension "d38" = 20
  dimension "d39" = 3
  dimension "d40" = 30
  dimension "d41" = 30
  dimension "d42" = 10
  dimension "d43" = 1.5
extrude "Extrusão3" cut sketch "Esboço3" against normal blind 4
sketch "Esboço4" plane through (215, 2, 90) normal (1, 0, 0) x (0, 0, -1)
  line L0 (179.25, -4) -> (180, -4) projected
  line L1 (180, -4) -> (181.2, -4)
  line L2 (181.2, -4) -> (181.2, 0)
  line L3 (181.2, 0) -> (180, 0)
  line L4 (0, 0) -> (180, 0) projected
  line L5 (180, 0) -> (180, -4)
  point P0 (90, -2)
  dimension "d46" = 1.2
  dimension "d47" = 4
extrude "Extrusão4" add sketch "Esboço4" against normal blind 430
equation "\"d3\" = 2 * d7"
equation "\"d6\" = 2 * d5"
properties material "Aço, carbono"
